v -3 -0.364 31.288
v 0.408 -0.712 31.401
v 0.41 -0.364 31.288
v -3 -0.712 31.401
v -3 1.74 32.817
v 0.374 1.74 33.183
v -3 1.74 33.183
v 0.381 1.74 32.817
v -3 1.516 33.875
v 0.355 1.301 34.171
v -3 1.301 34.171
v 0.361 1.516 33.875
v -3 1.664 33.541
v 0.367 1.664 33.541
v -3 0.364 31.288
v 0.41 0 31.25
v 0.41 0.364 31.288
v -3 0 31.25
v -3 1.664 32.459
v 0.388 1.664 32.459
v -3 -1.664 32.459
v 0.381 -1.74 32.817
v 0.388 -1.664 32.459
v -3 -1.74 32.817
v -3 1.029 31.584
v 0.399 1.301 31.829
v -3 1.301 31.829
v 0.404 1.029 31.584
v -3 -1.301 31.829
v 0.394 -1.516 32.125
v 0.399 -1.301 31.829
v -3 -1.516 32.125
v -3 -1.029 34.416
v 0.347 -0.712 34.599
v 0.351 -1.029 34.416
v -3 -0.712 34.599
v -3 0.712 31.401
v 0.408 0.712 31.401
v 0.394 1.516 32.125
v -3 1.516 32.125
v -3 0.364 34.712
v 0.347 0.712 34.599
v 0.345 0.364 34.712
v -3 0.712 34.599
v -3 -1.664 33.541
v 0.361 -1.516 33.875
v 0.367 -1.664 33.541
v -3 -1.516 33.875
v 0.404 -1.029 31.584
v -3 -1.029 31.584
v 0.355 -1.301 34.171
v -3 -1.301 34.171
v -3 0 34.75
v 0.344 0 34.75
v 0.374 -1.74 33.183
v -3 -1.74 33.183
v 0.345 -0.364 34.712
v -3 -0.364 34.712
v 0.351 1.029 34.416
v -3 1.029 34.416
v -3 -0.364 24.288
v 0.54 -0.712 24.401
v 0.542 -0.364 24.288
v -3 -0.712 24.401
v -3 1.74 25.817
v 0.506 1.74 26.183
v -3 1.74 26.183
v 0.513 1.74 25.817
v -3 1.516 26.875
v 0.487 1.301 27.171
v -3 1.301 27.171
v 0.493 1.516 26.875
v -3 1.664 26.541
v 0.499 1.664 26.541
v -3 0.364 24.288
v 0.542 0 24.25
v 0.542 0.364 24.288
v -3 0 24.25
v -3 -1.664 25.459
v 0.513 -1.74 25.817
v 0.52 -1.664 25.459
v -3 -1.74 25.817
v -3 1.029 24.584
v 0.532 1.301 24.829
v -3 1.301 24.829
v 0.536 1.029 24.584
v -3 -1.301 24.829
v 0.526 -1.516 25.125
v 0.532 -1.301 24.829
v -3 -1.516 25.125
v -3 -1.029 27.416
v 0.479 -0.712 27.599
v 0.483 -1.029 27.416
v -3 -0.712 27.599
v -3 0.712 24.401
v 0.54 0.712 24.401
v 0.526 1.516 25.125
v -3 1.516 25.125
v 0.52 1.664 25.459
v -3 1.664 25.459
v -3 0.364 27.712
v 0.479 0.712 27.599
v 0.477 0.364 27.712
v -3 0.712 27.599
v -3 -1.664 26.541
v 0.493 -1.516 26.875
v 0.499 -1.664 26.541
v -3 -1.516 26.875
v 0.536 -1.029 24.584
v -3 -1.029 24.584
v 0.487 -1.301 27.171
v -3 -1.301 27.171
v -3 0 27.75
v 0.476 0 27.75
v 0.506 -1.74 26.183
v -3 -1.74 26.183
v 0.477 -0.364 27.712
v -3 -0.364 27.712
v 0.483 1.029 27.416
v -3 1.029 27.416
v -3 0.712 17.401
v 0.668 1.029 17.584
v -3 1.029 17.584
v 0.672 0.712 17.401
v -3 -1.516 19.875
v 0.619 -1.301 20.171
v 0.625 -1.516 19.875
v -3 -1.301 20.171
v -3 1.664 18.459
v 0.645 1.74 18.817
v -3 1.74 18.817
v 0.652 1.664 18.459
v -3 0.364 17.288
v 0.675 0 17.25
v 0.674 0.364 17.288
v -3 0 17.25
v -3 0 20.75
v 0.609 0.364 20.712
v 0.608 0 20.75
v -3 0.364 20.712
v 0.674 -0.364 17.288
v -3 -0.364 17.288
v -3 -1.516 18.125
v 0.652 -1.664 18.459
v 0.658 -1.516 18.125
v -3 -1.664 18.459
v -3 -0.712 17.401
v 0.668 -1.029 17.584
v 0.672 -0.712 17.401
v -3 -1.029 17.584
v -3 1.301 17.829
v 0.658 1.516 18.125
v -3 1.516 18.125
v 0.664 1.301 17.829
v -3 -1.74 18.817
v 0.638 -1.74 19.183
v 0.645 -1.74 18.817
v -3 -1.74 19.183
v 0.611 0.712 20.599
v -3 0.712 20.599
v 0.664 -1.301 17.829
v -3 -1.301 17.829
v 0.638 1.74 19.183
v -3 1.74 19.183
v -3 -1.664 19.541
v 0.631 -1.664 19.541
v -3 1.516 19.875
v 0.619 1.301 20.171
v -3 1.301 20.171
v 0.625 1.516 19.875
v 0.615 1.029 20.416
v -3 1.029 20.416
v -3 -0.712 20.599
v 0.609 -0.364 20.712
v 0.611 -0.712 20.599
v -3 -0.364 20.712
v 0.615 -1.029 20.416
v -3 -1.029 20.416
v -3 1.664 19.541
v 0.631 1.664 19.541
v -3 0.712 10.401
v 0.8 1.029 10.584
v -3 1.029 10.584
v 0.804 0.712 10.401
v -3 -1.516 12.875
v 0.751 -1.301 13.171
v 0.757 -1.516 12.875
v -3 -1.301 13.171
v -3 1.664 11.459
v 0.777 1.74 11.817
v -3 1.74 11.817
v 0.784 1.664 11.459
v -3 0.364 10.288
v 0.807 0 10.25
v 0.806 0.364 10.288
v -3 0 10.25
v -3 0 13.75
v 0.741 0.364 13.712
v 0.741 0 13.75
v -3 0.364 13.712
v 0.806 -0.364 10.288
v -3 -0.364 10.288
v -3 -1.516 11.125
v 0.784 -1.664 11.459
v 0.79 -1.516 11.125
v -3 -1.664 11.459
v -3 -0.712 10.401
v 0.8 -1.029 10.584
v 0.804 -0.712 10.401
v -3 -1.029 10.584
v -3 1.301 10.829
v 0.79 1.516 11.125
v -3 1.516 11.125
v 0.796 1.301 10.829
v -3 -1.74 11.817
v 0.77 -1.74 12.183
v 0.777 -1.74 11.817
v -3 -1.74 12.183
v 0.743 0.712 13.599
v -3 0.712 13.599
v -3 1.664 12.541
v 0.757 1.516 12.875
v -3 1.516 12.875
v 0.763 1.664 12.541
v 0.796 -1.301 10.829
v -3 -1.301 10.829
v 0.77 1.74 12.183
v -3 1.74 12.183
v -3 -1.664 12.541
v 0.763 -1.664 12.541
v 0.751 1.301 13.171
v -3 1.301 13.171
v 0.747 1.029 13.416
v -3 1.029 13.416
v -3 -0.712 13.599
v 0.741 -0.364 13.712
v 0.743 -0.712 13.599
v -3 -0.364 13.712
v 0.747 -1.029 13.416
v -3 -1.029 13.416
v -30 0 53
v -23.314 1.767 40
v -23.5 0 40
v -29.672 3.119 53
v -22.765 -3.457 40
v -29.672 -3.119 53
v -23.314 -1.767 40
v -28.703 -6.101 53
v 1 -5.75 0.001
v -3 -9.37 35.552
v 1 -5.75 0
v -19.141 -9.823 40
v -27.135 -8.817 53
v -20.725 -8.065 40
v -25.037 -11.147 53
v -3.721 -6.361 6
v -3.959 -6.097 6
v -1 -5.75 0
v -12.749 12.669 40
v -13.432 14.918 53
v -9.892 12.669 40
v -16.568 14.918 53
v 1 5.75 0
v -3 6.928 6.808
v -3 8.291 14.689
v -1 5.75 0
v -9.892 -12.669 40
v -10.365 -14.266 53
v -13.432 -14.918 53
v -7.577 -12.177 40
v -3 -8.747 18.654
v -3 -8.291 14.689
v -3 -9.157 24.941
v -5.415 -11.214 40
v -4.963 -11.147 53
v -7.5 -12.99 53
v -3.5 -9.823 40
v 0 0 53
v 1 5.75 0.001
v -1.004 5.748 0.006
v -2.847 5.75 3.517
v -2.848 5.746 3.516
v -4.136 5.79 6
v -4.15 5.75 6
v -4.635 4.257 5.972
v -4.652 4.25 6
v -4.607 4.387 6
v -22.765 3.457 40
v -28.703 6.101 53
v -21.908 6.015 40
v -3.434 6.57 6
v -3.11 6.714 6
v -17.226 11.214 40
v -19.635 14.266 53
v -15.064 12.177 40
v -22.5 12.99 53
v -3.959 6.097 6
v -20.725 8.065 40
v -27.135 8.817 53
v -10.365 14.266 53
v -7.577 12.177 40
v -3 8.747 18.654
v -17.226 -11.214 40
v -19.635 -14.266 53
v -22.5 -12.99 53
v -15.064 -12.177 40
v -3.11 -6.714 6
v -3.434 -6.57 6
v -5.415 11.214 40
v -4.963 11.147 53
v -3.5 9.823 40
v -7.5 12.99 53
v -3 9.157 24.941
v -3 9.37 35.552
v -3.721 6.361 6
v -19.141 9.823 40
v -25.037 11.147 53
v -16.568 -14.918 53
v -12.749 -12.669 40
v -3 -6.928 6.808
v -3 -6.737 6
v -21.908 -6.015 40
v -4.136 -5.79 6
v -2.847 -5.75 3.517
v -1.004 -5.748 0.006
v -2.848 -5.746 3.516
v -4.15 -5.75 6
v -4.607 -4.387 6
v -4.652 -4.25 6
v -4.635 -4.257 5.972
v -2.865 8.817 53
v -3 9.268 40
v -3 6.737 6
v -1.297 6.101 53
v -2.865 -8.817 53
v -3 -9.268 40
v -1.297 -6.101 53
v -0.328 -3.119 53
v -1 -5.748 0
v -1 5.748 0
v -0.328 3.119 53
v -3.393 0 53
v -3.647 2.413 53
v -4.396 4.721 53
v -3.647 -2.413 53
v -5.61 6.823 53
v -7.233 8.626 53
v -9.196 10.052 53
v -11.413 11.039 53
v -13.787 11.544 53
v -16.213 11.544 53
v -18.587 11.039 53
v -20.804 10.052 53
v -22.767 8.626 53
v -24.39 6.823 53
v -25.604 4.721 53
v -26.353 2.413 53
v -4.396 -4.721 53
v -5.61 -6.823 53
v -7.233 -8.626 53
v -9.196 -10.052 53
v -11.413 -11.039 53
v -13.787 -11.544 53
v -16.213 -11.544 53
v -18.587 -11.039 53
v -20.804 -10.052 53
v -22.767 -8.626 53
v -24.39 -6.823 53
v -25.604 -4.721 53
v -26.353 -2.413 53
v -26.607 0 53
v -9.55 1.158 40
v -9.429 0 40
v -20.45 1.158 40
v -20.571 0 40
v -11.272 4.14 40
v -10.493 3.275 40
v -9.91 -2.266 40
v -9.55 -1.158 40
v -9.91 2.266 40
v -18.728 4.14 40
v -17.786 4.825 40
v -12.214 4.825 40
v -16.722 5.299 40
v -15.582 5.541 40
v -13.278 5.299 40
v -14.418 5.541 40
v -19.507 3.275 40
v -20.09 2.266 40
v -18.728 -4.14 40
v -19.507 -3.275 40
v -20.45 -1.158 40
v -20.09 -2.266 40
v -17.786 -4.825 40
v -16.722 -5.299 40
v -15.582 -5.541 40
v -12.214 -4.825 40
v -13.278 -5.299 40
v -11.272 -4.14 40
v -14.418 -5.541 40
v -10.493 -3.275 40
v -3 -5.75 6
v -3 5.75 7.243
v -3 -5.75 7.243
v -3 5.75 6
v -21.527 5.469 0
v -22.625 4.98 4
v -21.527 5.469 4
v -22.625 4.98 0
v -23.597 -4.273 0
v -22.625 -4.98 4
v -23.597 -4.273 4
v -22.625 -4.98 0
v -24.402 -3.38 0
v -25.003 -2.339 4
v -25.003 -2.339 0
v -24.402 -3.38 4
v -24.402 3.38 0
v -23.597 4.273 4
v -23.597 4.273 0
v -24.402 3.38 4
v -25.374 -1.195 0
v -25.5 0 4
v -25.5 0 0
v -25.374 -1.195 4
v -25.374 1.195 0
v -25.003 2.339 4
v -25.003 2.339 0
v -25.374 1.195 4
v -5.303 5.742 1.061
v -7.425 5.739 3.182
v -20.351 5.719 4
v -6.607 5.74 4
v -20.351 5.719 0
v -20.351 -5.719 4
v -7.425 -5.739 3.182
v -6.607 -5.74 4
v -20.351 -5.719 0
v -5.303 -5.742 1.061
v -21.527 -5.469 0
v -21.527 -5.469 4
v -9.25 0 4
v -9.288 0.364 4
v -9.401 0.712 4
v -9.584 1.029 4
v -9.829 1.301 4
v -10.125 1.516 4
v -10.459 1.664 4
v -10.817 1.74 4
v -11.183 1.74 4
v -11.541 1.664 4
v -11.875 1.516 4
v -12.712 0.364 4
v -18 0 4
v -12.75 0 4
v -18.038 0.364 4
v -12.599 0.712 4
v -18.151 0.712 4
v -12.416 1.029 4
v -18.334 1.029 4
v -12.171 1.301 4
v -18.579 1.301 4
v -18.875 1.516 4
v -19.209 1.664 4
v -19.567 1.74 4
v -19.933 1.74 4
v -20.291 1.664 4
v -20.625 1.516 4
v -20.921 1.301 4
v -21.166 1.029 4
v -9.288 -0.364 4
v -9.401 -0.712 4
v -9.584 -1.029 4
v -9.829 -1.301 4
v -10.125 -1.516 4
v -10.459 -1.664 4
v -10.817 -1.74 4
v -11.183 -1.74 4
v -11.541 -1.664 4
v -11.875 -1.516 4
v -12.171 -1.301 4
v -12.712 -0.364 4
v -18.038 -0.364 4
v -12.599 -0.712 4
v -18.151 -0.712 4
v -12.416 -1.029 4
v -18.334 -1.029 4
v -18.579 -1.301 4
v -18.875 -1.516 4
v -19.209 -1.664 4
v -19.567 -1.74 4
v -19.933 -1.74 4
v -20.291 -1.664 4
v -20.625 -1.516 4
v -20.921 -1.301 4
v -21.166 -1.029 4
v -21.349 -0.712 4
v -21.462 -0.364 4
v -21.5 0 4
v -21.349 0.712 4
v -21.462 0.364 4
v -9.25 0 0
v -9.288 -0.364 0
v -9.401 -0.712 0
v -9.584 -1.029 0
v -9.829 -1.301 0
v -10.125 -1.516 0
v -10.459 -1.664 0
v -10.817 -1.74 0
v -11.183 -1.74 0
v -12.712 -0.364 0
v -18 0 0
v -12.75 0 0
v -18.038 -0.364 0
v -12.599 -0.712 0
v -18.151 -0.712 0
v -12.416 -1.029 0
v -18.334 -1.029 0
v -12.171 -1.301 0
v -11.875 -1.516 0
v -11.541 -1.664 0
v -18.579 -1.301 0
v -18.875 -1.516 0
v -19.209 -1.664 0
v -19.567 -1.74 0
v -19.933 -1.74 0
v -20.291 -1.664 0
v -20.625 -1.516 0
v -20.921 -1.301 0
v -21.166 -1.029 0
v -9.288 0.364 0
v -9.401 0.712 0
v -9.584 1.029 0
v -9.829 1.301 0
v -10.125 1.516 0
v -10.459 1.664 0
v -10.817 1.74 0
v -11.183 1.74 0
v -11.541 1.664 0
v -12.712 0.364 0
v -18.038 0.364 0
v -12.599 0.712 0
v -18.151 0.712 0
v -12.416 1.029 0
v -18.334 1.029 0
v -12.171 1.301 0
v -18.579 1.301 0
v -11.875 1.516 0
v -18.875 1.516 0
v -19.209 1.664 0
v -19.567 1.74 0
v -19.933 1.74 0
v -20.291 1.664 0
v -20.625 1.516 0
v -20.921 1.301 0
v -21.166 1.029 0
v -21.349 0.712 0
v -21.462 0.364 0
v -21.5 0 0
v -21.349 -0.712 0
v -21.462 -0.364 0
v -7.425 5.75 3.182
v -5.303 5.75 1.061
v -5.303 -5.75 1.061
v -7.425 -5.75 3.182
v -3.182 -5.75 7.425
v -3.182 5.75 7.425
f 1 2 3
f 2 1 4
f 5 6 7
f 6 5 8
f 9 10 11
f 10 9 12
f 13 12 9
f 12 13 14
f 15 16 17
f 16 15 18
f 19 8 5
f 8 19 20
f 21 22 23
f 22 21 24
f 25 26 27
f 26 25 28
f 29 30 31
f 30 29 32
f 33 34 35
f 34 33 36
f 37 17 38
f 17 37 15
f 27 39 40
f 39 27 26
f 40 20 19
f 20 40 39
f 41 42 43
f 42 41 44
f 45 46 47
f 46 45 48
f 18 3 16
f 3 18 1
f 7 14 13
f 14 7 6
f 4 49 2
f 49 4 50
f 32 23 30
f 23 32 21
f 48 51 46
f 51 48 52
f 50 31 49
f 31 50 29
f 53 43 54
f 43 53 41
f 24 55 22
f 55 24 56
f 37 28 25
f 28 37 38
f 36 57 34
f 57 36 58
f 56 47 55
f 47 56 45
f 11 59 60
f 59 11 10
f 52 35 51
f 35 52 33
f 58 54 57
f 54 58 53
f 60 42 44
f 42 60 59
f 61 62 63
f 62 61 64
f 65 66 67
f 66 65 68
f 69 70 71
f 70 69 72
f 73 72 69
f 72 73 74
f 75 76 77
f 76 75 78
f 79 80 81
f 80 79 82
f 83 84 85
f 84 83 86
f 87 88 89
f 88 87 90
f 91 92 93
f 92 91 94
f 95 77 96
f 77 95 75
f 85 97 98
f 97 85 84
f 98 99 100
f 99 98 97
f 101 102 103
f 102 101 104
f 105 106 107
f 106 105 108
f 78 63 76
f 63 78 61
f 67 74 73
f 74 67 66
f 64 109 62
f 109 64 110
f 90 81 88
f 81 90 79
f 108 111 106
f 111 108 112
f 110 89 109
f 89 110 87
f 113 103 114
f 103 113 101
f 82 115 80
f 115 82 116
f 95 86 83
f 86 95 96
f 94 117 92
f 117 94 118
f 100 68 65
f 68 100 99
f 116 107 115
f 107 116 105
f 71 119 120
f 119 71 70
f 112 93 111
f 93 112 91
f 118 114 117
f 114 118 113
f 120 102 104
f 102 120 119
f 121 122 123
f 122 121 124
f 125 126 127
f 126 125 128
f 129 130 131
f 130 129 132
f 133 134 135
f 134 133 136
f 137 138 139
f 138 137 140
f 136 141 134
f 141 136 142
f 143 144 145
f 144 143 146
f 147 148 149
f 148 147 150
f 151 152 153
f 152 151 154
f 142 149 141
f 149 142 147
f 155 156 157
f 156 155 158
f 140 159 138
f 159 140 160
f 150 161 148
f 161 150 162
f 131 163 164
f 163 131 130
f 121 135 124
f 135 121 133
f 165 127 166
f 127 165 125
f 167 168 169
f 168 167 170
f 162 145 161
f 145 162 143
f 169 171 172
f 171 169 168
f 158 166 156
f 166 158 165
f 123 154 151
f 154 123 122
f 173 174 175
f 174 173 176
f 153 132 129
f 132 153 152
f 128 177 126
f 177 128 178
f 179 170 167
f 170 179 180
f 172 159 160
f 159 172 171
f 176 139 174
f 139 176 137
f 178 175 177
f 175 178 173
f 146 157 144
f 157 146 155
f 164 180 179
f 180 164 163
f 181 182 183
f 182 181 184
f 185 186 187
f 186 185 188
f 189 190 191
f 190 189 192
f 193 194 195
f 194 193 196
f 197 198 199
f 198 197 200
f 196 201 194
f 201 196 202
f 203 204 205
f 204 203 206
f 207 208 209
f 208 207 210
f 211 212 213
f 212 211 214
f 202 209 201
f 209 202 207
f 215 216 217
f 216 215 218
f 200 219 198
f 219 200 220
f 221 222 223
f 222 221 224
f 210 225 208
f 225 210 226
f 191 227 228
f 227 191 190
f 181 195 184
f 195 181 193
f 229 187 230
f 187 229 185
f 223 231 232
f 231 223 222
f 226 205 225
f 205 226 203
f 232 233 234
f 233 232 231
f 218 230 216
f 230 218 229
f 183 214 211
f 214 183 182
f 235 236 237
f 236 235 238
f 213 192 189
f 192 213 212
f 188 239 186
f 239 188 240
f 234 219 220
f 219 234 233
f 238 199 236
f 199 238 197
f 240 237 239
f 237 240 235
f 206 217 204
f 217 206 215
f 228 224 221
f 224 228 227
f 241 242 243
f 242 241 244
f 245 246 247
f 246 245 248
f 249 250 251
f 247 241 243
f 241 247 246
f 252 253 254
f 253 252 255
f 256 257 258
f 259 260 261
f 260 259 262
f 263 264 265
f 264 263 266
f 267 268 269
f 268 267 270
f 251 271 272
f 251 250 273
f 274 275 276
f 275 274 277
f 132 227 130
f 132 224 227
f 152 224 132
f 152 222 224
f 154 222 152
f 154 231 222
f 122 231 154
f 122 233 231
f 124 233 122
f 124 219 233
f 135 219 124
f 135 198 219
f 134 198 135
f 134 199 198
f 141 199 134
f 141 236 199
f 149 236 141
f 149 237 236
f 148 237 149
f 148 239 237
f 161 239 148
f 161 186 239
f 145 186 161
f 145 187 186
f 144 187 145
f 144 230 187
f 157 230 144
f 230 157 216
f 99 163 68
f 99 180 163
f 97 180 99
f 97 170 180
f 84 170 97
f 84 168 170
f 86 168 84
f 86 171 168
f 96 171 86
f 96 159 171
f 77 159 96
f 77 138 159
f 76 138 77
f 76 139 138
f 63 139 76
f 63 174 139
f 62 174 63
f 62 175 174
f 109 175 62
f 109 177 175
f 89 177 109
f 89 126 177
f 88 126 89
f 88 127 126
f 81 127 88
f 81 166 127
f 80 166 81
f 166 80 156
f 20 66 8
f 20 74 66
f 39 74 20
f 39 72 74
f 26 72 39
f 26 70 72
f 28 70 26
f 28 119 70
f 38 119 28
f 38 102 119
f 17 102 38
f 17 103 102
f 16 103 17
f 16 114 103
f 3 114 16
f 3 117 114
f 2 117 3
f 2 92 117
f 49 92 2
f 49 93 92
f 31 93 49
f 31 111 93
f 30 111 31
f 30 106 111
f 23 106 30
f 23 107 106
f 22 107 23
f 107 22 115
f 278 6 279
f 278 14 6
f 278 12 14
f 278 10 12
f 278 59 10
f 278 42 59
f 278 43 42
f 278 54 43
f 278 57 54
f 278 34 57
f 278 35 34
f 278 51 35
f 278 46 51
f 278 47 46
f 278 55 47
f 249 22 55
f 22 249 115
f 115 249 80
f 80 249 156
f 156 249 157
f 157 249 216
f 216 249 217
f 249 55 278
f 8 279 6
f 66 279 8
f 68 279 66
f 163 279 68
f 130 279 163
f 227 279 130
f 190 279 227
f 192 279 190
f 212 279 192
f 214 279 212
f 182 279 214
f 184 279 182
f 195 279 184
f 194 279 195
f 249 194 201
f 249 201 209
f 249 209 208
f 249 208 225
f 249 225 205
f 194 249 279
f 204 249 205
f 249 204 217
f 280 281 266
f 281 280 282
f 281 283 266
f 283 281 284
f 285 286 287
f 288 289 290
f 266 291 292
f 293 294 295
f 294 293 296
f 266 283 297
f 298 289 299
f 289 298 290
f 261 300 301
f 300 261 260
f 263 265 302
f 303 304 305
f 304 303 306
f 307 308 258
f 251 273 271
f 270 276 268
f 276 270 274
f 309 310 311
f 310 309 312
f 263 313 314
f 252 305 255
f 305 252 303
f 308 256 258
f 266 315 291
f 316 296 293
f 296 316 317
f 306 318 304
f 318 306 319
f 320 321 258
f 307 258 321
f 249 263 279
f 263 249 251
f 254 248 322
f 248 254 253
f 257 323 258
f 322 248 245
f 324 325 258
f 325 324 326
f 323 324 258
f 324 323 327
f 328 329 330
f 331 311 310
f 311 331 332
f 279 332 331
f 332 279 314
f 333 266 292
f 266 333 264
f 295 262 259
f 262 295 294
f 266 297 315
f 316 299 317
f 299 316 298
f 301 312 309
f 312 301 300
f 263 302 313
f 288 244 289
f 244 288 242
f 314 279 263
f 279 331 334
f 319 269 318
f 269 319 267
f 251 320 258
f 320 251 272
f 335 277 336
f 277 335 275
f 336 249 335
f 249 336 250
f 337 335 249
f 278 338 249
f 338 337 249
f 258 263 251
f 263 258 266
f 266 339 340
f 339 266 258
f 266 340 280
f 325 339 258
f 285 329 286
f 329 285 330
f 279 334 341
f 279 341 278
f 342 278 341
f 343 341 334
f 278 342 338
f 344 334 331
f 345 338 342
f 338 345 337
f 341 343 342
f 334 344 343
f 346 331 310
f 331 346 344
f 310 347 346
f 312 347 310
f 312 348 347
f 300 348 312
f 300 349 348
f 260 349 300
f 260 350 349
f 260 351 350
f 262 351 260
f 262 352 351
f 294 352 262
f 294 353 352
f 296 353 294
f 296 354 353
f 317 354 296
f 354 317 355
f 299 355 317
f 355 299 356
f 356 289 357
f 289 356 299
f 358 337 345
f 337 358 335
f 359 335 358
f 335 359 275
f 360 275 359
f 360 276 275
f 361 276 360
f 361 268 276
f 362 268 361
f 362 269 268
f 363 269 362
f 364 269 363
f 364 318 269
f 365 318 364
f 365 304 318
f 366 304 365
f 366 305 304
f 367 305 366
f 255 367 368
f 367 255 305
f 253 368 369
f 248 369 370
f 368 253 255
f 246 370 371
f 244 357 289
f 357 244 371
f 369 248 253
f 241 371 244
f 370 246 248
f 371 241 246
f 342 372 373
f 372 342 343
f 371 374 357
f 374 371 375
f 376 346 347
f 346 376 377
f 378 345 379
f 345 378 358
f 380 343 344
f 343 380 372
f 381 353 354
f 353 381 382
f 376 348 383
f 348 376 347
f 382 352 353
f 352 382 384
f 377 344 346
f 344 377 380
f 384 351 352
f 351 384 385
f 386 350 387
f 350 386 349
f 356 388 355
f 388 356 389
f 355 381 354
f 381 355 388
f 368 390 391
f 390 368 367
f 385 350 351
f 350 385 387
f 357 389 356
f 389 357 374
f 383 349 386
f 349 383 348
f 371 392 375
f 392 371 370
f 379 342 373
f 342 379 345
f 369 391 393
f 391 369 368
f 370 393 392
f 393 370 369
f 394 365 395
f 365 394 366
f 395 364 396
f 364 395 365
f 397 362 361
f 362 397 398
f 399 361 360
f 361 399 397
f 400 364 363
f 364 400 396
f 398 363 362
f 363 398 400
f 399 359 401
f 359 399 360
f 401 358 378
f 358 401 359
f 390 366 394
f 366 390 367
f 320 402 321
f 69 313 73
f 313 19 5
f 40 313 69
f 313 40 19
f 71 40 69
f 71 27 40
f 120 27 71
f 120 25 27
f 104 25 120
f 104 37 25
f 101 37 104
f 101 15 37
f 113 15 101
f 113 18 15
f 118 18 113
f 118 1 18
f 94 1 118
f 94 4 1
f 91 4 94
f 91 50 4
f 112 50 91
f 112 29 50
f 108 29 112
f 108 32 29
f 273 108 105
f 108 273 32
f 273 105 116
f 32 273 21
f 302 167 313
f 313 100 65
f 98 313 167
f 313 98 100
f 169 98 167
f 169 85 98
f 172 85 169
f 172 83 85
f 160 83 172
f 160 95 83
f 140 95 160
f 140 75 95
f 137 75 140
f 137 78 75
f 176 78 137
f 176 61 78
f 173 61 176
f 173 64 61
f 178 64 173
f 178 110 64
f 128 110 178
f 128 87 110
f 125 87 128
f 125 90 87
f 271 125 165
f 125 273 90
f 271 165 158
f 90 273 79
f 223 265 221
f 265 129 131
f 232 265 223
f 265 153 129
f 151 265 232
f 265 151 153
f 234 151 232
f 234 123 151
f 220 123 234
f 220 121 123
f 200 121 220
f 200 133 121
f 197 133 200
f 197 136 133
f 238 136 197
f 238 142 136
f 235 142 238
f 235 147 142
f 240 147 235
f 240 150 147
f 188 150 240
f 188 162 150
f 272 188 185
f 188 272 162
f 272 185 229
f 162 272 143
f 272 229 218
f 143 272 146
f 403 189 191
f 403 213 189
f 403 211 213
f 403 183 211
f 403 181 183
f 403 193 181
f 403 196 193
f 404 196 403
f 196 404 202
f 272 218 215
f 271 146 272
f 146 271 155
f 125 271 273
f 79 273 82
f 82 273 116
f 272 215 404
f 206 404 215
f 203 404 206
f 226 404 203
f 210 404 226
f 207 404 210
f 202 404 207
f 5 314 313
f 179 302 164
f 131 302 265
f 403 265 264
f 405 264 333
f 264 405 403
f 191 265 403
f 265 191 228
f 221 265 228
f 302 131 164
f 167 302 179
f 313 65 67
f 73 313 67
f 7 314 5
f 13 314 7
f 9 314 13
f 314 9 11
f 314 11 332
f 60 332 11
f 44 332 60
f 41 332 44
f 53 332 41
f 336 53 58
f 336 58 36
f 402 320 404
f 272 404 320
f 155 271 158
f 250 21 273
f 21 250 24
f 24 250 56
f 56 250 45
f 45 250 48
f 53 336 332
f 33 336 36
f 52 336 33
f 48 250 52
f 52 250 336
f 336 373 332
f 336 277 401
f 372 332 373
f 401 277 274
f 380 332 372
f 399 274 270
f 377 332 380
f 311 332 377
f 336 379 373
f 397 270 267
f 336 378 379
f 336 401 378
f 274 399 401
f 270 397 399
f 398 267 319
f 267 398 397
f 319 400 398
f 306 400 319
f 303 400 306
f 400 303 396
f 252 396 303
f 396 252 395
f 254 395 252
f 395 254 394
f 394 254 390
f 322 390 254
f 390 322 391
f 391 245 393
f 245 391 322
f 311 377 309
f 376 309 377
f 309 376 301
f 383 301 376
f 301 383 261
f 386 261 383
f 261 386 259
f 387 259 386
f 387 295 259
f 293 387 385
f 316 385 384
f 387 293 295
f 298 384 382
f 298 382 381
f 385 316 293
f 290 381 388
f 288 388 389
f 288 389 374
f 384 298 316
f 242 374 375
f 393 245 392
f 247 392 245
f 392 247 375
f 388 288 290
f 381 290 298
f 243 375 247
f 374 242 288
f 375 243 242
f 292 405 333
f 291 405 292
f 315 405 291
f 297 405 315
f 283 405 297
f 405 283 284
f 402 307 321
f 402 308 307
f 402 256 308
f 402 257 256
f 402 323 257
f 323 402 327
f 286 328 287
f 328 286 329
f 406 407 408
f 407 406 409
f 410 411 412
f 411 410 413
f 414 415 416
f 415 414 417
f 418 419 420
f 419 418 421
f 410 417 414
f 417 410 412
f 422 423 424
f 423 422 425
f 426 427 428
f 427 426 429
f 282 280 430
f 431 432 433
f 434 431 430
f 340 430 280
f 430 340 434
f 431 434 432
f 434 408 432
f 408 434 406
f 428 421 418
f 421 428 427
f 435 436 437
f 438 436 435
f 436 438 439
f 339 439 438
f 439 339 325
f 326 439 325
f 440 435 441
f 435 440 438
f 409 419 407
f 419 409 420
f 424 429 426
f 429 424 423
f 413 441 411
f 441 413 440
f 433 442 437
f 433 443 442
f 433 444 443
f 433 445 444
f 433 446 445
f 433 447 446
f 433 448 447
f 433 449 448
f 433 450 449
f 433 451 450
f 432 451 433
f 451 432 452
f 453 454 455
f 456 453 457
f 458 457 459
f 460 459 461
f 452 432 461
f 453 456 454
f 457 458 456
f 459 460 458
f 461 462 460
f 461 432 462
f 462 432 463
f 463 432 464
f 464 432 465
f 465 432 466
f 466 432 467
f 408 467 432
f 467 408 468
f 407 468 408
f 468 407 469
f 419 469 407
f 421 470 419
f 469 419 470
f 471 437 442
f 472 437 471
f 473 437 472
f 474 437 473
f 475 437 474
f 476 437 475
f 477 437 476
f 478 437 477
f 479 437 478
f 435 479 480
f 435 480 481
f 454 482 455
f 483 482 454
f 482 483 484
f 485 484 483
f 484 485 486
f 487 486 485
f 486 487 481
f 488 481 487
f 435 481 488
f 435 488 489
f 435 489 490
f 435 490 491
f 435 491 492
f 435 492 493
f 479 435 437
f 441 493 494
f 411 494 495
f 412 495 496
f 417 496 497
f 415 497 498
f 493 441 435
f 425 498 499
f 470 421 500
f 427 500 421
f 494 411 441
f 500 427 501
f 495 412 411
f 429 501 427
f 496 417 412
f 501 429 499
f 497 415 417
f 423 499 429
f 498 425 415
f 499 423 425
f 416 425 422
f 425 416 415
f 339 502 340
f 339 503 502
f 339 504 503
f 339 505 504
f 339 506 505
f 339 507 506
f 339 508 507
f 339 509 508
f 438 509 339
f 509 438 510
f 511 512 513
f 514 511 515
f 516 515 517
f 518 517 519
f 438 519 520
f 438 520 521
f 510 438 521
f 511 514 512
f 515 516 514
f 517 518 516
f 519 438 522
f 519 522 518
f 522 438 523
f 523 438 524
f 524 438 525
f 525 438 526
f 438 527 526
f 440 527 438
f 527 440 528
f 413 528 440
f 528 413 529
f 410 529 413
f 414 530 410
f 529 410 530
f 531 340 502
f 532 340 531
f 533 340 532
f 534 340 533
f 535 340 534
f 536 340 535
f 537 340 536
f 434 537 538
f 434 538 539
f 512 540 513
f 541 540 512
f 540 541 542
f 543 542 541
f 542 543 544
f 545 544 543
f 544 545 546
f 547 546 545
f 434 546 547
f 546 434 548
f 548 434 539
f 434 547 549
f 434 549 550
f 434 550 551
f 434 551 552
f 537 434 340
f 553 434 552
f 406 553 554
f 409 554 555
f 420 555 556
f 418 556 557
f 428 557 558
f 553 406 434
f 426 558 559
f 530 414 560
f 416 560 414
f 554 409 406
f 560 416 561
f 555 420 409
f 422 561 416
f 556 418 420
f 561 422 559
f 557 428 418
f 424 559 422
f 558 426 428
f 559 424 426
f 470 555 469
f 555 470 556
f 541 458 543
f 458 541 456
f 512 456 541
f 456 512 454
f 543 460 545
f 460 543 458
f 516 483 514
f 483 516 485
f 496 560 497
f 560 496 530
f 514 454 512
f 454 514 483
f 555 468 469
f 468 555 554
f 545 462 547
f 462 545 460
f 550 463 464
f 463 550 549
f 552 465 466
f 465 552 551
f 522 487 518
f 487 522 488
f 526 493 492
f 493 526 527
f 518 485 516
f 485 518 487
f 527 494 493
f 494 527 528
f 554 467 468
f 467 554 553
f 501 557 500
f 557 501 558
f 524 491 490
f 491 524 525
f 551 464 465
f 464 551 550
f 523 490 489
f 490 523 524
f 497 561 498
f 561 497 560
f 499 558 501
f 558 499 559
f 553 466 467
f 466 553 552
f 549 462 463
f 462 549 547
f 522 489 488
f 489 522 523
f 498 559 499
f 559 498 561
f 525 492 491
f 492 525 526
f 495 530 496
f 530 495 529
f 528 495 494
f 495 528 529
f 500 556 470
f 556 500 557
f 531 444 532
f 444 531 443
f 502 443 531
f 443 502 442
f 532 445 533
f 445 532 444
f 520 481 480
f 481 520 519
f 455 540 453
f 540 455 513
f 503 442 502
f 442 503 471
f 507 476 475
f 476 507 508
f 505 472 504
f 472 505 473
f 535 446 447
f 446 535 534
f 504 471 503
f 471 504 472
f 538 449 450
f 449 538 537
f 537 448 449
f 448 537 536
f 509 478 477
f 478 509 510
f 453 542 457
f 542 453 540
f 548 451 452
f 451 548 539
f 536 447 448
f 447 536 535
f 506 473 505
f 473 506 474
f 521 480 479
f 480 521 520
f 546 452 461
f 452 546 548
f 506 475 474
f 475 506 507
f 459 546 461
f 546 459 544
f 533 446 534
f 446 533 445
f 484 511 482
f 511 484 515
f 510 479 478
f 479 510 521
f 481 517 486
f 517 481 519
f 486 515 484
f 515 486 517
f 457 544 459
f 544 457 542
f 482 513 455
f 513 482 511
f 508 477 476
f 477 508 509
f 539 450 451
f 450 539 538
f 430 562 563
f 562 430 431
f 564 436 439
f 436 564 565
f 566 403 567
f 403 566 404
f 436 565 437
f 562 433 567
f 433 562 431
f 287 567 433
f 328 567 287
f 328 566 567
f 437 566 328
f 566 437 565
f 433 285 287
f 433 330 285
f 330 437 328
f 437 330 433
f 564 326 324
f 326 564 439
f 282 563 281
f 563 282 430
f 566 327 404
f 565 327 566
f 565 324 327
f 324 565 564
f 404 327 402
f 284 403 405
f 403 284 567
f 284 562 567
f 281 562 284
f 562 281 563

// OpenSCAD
th = 4;
glob_th = th;
screw_dst = 8.75;
screw_r = 3.5/2;

cone_r = 15;
cone_dst = 40;

module cone() {
    th = 2;
    gap_h = 15;
    h = 30;
    r=cone_r;
    pos = [-r,0,cone_dst-17];
    translate(pos)
    difference() {
        hull() {
            cylinder(r1=0, r2=r, h=h);
            //translate(-pos+[0,-((screw_r+th)*8)/2,cone_dst])
            //cube([0.0001,(screw_r+th)*8,13]);
            
            #translate(-pos) cube([th,(screw_r+glob_th)*2, 0.001], true);

        }
        
        translate([0,0,h/10+th])
        cylinder(r1=0, r2=r-th, h=h-th);
        
        translate([-18,0,0])
        cube([30,30,gap_h+th]*2, true);
        
        for (i = [0:3]) 
        translate([0,0,10-7*i]) rotate([0,90,0]) cylinder(r=screw_r, h=100, $fn=30);
        

    }
}

cone();

module holder() {
    cube_dst = screw_dst+11;
    translate([-cube_dst,0,0])
    difference() {
        hull() {
            cylinder(r=th+screw_r, h=th, $fn=30);
            translate([screw_dst,0,0]) cylinder(r=th+screw_r, h=th, $fn=30);
            translate([cube_dst,0,th/2]) cube([.00001,(screw_r+th)*2,th], true);
        }
        cylinder(r=screw_r, h=100, $fn=30);
        translate([screw_dst,0,0])cylinder(r=screw_r, h=100, $fn=30);
    }
    rotate([0,-45,0]) translate([0,0,6])    cube([6,(screw_r+th)*2, 3], true);
}

holder();
